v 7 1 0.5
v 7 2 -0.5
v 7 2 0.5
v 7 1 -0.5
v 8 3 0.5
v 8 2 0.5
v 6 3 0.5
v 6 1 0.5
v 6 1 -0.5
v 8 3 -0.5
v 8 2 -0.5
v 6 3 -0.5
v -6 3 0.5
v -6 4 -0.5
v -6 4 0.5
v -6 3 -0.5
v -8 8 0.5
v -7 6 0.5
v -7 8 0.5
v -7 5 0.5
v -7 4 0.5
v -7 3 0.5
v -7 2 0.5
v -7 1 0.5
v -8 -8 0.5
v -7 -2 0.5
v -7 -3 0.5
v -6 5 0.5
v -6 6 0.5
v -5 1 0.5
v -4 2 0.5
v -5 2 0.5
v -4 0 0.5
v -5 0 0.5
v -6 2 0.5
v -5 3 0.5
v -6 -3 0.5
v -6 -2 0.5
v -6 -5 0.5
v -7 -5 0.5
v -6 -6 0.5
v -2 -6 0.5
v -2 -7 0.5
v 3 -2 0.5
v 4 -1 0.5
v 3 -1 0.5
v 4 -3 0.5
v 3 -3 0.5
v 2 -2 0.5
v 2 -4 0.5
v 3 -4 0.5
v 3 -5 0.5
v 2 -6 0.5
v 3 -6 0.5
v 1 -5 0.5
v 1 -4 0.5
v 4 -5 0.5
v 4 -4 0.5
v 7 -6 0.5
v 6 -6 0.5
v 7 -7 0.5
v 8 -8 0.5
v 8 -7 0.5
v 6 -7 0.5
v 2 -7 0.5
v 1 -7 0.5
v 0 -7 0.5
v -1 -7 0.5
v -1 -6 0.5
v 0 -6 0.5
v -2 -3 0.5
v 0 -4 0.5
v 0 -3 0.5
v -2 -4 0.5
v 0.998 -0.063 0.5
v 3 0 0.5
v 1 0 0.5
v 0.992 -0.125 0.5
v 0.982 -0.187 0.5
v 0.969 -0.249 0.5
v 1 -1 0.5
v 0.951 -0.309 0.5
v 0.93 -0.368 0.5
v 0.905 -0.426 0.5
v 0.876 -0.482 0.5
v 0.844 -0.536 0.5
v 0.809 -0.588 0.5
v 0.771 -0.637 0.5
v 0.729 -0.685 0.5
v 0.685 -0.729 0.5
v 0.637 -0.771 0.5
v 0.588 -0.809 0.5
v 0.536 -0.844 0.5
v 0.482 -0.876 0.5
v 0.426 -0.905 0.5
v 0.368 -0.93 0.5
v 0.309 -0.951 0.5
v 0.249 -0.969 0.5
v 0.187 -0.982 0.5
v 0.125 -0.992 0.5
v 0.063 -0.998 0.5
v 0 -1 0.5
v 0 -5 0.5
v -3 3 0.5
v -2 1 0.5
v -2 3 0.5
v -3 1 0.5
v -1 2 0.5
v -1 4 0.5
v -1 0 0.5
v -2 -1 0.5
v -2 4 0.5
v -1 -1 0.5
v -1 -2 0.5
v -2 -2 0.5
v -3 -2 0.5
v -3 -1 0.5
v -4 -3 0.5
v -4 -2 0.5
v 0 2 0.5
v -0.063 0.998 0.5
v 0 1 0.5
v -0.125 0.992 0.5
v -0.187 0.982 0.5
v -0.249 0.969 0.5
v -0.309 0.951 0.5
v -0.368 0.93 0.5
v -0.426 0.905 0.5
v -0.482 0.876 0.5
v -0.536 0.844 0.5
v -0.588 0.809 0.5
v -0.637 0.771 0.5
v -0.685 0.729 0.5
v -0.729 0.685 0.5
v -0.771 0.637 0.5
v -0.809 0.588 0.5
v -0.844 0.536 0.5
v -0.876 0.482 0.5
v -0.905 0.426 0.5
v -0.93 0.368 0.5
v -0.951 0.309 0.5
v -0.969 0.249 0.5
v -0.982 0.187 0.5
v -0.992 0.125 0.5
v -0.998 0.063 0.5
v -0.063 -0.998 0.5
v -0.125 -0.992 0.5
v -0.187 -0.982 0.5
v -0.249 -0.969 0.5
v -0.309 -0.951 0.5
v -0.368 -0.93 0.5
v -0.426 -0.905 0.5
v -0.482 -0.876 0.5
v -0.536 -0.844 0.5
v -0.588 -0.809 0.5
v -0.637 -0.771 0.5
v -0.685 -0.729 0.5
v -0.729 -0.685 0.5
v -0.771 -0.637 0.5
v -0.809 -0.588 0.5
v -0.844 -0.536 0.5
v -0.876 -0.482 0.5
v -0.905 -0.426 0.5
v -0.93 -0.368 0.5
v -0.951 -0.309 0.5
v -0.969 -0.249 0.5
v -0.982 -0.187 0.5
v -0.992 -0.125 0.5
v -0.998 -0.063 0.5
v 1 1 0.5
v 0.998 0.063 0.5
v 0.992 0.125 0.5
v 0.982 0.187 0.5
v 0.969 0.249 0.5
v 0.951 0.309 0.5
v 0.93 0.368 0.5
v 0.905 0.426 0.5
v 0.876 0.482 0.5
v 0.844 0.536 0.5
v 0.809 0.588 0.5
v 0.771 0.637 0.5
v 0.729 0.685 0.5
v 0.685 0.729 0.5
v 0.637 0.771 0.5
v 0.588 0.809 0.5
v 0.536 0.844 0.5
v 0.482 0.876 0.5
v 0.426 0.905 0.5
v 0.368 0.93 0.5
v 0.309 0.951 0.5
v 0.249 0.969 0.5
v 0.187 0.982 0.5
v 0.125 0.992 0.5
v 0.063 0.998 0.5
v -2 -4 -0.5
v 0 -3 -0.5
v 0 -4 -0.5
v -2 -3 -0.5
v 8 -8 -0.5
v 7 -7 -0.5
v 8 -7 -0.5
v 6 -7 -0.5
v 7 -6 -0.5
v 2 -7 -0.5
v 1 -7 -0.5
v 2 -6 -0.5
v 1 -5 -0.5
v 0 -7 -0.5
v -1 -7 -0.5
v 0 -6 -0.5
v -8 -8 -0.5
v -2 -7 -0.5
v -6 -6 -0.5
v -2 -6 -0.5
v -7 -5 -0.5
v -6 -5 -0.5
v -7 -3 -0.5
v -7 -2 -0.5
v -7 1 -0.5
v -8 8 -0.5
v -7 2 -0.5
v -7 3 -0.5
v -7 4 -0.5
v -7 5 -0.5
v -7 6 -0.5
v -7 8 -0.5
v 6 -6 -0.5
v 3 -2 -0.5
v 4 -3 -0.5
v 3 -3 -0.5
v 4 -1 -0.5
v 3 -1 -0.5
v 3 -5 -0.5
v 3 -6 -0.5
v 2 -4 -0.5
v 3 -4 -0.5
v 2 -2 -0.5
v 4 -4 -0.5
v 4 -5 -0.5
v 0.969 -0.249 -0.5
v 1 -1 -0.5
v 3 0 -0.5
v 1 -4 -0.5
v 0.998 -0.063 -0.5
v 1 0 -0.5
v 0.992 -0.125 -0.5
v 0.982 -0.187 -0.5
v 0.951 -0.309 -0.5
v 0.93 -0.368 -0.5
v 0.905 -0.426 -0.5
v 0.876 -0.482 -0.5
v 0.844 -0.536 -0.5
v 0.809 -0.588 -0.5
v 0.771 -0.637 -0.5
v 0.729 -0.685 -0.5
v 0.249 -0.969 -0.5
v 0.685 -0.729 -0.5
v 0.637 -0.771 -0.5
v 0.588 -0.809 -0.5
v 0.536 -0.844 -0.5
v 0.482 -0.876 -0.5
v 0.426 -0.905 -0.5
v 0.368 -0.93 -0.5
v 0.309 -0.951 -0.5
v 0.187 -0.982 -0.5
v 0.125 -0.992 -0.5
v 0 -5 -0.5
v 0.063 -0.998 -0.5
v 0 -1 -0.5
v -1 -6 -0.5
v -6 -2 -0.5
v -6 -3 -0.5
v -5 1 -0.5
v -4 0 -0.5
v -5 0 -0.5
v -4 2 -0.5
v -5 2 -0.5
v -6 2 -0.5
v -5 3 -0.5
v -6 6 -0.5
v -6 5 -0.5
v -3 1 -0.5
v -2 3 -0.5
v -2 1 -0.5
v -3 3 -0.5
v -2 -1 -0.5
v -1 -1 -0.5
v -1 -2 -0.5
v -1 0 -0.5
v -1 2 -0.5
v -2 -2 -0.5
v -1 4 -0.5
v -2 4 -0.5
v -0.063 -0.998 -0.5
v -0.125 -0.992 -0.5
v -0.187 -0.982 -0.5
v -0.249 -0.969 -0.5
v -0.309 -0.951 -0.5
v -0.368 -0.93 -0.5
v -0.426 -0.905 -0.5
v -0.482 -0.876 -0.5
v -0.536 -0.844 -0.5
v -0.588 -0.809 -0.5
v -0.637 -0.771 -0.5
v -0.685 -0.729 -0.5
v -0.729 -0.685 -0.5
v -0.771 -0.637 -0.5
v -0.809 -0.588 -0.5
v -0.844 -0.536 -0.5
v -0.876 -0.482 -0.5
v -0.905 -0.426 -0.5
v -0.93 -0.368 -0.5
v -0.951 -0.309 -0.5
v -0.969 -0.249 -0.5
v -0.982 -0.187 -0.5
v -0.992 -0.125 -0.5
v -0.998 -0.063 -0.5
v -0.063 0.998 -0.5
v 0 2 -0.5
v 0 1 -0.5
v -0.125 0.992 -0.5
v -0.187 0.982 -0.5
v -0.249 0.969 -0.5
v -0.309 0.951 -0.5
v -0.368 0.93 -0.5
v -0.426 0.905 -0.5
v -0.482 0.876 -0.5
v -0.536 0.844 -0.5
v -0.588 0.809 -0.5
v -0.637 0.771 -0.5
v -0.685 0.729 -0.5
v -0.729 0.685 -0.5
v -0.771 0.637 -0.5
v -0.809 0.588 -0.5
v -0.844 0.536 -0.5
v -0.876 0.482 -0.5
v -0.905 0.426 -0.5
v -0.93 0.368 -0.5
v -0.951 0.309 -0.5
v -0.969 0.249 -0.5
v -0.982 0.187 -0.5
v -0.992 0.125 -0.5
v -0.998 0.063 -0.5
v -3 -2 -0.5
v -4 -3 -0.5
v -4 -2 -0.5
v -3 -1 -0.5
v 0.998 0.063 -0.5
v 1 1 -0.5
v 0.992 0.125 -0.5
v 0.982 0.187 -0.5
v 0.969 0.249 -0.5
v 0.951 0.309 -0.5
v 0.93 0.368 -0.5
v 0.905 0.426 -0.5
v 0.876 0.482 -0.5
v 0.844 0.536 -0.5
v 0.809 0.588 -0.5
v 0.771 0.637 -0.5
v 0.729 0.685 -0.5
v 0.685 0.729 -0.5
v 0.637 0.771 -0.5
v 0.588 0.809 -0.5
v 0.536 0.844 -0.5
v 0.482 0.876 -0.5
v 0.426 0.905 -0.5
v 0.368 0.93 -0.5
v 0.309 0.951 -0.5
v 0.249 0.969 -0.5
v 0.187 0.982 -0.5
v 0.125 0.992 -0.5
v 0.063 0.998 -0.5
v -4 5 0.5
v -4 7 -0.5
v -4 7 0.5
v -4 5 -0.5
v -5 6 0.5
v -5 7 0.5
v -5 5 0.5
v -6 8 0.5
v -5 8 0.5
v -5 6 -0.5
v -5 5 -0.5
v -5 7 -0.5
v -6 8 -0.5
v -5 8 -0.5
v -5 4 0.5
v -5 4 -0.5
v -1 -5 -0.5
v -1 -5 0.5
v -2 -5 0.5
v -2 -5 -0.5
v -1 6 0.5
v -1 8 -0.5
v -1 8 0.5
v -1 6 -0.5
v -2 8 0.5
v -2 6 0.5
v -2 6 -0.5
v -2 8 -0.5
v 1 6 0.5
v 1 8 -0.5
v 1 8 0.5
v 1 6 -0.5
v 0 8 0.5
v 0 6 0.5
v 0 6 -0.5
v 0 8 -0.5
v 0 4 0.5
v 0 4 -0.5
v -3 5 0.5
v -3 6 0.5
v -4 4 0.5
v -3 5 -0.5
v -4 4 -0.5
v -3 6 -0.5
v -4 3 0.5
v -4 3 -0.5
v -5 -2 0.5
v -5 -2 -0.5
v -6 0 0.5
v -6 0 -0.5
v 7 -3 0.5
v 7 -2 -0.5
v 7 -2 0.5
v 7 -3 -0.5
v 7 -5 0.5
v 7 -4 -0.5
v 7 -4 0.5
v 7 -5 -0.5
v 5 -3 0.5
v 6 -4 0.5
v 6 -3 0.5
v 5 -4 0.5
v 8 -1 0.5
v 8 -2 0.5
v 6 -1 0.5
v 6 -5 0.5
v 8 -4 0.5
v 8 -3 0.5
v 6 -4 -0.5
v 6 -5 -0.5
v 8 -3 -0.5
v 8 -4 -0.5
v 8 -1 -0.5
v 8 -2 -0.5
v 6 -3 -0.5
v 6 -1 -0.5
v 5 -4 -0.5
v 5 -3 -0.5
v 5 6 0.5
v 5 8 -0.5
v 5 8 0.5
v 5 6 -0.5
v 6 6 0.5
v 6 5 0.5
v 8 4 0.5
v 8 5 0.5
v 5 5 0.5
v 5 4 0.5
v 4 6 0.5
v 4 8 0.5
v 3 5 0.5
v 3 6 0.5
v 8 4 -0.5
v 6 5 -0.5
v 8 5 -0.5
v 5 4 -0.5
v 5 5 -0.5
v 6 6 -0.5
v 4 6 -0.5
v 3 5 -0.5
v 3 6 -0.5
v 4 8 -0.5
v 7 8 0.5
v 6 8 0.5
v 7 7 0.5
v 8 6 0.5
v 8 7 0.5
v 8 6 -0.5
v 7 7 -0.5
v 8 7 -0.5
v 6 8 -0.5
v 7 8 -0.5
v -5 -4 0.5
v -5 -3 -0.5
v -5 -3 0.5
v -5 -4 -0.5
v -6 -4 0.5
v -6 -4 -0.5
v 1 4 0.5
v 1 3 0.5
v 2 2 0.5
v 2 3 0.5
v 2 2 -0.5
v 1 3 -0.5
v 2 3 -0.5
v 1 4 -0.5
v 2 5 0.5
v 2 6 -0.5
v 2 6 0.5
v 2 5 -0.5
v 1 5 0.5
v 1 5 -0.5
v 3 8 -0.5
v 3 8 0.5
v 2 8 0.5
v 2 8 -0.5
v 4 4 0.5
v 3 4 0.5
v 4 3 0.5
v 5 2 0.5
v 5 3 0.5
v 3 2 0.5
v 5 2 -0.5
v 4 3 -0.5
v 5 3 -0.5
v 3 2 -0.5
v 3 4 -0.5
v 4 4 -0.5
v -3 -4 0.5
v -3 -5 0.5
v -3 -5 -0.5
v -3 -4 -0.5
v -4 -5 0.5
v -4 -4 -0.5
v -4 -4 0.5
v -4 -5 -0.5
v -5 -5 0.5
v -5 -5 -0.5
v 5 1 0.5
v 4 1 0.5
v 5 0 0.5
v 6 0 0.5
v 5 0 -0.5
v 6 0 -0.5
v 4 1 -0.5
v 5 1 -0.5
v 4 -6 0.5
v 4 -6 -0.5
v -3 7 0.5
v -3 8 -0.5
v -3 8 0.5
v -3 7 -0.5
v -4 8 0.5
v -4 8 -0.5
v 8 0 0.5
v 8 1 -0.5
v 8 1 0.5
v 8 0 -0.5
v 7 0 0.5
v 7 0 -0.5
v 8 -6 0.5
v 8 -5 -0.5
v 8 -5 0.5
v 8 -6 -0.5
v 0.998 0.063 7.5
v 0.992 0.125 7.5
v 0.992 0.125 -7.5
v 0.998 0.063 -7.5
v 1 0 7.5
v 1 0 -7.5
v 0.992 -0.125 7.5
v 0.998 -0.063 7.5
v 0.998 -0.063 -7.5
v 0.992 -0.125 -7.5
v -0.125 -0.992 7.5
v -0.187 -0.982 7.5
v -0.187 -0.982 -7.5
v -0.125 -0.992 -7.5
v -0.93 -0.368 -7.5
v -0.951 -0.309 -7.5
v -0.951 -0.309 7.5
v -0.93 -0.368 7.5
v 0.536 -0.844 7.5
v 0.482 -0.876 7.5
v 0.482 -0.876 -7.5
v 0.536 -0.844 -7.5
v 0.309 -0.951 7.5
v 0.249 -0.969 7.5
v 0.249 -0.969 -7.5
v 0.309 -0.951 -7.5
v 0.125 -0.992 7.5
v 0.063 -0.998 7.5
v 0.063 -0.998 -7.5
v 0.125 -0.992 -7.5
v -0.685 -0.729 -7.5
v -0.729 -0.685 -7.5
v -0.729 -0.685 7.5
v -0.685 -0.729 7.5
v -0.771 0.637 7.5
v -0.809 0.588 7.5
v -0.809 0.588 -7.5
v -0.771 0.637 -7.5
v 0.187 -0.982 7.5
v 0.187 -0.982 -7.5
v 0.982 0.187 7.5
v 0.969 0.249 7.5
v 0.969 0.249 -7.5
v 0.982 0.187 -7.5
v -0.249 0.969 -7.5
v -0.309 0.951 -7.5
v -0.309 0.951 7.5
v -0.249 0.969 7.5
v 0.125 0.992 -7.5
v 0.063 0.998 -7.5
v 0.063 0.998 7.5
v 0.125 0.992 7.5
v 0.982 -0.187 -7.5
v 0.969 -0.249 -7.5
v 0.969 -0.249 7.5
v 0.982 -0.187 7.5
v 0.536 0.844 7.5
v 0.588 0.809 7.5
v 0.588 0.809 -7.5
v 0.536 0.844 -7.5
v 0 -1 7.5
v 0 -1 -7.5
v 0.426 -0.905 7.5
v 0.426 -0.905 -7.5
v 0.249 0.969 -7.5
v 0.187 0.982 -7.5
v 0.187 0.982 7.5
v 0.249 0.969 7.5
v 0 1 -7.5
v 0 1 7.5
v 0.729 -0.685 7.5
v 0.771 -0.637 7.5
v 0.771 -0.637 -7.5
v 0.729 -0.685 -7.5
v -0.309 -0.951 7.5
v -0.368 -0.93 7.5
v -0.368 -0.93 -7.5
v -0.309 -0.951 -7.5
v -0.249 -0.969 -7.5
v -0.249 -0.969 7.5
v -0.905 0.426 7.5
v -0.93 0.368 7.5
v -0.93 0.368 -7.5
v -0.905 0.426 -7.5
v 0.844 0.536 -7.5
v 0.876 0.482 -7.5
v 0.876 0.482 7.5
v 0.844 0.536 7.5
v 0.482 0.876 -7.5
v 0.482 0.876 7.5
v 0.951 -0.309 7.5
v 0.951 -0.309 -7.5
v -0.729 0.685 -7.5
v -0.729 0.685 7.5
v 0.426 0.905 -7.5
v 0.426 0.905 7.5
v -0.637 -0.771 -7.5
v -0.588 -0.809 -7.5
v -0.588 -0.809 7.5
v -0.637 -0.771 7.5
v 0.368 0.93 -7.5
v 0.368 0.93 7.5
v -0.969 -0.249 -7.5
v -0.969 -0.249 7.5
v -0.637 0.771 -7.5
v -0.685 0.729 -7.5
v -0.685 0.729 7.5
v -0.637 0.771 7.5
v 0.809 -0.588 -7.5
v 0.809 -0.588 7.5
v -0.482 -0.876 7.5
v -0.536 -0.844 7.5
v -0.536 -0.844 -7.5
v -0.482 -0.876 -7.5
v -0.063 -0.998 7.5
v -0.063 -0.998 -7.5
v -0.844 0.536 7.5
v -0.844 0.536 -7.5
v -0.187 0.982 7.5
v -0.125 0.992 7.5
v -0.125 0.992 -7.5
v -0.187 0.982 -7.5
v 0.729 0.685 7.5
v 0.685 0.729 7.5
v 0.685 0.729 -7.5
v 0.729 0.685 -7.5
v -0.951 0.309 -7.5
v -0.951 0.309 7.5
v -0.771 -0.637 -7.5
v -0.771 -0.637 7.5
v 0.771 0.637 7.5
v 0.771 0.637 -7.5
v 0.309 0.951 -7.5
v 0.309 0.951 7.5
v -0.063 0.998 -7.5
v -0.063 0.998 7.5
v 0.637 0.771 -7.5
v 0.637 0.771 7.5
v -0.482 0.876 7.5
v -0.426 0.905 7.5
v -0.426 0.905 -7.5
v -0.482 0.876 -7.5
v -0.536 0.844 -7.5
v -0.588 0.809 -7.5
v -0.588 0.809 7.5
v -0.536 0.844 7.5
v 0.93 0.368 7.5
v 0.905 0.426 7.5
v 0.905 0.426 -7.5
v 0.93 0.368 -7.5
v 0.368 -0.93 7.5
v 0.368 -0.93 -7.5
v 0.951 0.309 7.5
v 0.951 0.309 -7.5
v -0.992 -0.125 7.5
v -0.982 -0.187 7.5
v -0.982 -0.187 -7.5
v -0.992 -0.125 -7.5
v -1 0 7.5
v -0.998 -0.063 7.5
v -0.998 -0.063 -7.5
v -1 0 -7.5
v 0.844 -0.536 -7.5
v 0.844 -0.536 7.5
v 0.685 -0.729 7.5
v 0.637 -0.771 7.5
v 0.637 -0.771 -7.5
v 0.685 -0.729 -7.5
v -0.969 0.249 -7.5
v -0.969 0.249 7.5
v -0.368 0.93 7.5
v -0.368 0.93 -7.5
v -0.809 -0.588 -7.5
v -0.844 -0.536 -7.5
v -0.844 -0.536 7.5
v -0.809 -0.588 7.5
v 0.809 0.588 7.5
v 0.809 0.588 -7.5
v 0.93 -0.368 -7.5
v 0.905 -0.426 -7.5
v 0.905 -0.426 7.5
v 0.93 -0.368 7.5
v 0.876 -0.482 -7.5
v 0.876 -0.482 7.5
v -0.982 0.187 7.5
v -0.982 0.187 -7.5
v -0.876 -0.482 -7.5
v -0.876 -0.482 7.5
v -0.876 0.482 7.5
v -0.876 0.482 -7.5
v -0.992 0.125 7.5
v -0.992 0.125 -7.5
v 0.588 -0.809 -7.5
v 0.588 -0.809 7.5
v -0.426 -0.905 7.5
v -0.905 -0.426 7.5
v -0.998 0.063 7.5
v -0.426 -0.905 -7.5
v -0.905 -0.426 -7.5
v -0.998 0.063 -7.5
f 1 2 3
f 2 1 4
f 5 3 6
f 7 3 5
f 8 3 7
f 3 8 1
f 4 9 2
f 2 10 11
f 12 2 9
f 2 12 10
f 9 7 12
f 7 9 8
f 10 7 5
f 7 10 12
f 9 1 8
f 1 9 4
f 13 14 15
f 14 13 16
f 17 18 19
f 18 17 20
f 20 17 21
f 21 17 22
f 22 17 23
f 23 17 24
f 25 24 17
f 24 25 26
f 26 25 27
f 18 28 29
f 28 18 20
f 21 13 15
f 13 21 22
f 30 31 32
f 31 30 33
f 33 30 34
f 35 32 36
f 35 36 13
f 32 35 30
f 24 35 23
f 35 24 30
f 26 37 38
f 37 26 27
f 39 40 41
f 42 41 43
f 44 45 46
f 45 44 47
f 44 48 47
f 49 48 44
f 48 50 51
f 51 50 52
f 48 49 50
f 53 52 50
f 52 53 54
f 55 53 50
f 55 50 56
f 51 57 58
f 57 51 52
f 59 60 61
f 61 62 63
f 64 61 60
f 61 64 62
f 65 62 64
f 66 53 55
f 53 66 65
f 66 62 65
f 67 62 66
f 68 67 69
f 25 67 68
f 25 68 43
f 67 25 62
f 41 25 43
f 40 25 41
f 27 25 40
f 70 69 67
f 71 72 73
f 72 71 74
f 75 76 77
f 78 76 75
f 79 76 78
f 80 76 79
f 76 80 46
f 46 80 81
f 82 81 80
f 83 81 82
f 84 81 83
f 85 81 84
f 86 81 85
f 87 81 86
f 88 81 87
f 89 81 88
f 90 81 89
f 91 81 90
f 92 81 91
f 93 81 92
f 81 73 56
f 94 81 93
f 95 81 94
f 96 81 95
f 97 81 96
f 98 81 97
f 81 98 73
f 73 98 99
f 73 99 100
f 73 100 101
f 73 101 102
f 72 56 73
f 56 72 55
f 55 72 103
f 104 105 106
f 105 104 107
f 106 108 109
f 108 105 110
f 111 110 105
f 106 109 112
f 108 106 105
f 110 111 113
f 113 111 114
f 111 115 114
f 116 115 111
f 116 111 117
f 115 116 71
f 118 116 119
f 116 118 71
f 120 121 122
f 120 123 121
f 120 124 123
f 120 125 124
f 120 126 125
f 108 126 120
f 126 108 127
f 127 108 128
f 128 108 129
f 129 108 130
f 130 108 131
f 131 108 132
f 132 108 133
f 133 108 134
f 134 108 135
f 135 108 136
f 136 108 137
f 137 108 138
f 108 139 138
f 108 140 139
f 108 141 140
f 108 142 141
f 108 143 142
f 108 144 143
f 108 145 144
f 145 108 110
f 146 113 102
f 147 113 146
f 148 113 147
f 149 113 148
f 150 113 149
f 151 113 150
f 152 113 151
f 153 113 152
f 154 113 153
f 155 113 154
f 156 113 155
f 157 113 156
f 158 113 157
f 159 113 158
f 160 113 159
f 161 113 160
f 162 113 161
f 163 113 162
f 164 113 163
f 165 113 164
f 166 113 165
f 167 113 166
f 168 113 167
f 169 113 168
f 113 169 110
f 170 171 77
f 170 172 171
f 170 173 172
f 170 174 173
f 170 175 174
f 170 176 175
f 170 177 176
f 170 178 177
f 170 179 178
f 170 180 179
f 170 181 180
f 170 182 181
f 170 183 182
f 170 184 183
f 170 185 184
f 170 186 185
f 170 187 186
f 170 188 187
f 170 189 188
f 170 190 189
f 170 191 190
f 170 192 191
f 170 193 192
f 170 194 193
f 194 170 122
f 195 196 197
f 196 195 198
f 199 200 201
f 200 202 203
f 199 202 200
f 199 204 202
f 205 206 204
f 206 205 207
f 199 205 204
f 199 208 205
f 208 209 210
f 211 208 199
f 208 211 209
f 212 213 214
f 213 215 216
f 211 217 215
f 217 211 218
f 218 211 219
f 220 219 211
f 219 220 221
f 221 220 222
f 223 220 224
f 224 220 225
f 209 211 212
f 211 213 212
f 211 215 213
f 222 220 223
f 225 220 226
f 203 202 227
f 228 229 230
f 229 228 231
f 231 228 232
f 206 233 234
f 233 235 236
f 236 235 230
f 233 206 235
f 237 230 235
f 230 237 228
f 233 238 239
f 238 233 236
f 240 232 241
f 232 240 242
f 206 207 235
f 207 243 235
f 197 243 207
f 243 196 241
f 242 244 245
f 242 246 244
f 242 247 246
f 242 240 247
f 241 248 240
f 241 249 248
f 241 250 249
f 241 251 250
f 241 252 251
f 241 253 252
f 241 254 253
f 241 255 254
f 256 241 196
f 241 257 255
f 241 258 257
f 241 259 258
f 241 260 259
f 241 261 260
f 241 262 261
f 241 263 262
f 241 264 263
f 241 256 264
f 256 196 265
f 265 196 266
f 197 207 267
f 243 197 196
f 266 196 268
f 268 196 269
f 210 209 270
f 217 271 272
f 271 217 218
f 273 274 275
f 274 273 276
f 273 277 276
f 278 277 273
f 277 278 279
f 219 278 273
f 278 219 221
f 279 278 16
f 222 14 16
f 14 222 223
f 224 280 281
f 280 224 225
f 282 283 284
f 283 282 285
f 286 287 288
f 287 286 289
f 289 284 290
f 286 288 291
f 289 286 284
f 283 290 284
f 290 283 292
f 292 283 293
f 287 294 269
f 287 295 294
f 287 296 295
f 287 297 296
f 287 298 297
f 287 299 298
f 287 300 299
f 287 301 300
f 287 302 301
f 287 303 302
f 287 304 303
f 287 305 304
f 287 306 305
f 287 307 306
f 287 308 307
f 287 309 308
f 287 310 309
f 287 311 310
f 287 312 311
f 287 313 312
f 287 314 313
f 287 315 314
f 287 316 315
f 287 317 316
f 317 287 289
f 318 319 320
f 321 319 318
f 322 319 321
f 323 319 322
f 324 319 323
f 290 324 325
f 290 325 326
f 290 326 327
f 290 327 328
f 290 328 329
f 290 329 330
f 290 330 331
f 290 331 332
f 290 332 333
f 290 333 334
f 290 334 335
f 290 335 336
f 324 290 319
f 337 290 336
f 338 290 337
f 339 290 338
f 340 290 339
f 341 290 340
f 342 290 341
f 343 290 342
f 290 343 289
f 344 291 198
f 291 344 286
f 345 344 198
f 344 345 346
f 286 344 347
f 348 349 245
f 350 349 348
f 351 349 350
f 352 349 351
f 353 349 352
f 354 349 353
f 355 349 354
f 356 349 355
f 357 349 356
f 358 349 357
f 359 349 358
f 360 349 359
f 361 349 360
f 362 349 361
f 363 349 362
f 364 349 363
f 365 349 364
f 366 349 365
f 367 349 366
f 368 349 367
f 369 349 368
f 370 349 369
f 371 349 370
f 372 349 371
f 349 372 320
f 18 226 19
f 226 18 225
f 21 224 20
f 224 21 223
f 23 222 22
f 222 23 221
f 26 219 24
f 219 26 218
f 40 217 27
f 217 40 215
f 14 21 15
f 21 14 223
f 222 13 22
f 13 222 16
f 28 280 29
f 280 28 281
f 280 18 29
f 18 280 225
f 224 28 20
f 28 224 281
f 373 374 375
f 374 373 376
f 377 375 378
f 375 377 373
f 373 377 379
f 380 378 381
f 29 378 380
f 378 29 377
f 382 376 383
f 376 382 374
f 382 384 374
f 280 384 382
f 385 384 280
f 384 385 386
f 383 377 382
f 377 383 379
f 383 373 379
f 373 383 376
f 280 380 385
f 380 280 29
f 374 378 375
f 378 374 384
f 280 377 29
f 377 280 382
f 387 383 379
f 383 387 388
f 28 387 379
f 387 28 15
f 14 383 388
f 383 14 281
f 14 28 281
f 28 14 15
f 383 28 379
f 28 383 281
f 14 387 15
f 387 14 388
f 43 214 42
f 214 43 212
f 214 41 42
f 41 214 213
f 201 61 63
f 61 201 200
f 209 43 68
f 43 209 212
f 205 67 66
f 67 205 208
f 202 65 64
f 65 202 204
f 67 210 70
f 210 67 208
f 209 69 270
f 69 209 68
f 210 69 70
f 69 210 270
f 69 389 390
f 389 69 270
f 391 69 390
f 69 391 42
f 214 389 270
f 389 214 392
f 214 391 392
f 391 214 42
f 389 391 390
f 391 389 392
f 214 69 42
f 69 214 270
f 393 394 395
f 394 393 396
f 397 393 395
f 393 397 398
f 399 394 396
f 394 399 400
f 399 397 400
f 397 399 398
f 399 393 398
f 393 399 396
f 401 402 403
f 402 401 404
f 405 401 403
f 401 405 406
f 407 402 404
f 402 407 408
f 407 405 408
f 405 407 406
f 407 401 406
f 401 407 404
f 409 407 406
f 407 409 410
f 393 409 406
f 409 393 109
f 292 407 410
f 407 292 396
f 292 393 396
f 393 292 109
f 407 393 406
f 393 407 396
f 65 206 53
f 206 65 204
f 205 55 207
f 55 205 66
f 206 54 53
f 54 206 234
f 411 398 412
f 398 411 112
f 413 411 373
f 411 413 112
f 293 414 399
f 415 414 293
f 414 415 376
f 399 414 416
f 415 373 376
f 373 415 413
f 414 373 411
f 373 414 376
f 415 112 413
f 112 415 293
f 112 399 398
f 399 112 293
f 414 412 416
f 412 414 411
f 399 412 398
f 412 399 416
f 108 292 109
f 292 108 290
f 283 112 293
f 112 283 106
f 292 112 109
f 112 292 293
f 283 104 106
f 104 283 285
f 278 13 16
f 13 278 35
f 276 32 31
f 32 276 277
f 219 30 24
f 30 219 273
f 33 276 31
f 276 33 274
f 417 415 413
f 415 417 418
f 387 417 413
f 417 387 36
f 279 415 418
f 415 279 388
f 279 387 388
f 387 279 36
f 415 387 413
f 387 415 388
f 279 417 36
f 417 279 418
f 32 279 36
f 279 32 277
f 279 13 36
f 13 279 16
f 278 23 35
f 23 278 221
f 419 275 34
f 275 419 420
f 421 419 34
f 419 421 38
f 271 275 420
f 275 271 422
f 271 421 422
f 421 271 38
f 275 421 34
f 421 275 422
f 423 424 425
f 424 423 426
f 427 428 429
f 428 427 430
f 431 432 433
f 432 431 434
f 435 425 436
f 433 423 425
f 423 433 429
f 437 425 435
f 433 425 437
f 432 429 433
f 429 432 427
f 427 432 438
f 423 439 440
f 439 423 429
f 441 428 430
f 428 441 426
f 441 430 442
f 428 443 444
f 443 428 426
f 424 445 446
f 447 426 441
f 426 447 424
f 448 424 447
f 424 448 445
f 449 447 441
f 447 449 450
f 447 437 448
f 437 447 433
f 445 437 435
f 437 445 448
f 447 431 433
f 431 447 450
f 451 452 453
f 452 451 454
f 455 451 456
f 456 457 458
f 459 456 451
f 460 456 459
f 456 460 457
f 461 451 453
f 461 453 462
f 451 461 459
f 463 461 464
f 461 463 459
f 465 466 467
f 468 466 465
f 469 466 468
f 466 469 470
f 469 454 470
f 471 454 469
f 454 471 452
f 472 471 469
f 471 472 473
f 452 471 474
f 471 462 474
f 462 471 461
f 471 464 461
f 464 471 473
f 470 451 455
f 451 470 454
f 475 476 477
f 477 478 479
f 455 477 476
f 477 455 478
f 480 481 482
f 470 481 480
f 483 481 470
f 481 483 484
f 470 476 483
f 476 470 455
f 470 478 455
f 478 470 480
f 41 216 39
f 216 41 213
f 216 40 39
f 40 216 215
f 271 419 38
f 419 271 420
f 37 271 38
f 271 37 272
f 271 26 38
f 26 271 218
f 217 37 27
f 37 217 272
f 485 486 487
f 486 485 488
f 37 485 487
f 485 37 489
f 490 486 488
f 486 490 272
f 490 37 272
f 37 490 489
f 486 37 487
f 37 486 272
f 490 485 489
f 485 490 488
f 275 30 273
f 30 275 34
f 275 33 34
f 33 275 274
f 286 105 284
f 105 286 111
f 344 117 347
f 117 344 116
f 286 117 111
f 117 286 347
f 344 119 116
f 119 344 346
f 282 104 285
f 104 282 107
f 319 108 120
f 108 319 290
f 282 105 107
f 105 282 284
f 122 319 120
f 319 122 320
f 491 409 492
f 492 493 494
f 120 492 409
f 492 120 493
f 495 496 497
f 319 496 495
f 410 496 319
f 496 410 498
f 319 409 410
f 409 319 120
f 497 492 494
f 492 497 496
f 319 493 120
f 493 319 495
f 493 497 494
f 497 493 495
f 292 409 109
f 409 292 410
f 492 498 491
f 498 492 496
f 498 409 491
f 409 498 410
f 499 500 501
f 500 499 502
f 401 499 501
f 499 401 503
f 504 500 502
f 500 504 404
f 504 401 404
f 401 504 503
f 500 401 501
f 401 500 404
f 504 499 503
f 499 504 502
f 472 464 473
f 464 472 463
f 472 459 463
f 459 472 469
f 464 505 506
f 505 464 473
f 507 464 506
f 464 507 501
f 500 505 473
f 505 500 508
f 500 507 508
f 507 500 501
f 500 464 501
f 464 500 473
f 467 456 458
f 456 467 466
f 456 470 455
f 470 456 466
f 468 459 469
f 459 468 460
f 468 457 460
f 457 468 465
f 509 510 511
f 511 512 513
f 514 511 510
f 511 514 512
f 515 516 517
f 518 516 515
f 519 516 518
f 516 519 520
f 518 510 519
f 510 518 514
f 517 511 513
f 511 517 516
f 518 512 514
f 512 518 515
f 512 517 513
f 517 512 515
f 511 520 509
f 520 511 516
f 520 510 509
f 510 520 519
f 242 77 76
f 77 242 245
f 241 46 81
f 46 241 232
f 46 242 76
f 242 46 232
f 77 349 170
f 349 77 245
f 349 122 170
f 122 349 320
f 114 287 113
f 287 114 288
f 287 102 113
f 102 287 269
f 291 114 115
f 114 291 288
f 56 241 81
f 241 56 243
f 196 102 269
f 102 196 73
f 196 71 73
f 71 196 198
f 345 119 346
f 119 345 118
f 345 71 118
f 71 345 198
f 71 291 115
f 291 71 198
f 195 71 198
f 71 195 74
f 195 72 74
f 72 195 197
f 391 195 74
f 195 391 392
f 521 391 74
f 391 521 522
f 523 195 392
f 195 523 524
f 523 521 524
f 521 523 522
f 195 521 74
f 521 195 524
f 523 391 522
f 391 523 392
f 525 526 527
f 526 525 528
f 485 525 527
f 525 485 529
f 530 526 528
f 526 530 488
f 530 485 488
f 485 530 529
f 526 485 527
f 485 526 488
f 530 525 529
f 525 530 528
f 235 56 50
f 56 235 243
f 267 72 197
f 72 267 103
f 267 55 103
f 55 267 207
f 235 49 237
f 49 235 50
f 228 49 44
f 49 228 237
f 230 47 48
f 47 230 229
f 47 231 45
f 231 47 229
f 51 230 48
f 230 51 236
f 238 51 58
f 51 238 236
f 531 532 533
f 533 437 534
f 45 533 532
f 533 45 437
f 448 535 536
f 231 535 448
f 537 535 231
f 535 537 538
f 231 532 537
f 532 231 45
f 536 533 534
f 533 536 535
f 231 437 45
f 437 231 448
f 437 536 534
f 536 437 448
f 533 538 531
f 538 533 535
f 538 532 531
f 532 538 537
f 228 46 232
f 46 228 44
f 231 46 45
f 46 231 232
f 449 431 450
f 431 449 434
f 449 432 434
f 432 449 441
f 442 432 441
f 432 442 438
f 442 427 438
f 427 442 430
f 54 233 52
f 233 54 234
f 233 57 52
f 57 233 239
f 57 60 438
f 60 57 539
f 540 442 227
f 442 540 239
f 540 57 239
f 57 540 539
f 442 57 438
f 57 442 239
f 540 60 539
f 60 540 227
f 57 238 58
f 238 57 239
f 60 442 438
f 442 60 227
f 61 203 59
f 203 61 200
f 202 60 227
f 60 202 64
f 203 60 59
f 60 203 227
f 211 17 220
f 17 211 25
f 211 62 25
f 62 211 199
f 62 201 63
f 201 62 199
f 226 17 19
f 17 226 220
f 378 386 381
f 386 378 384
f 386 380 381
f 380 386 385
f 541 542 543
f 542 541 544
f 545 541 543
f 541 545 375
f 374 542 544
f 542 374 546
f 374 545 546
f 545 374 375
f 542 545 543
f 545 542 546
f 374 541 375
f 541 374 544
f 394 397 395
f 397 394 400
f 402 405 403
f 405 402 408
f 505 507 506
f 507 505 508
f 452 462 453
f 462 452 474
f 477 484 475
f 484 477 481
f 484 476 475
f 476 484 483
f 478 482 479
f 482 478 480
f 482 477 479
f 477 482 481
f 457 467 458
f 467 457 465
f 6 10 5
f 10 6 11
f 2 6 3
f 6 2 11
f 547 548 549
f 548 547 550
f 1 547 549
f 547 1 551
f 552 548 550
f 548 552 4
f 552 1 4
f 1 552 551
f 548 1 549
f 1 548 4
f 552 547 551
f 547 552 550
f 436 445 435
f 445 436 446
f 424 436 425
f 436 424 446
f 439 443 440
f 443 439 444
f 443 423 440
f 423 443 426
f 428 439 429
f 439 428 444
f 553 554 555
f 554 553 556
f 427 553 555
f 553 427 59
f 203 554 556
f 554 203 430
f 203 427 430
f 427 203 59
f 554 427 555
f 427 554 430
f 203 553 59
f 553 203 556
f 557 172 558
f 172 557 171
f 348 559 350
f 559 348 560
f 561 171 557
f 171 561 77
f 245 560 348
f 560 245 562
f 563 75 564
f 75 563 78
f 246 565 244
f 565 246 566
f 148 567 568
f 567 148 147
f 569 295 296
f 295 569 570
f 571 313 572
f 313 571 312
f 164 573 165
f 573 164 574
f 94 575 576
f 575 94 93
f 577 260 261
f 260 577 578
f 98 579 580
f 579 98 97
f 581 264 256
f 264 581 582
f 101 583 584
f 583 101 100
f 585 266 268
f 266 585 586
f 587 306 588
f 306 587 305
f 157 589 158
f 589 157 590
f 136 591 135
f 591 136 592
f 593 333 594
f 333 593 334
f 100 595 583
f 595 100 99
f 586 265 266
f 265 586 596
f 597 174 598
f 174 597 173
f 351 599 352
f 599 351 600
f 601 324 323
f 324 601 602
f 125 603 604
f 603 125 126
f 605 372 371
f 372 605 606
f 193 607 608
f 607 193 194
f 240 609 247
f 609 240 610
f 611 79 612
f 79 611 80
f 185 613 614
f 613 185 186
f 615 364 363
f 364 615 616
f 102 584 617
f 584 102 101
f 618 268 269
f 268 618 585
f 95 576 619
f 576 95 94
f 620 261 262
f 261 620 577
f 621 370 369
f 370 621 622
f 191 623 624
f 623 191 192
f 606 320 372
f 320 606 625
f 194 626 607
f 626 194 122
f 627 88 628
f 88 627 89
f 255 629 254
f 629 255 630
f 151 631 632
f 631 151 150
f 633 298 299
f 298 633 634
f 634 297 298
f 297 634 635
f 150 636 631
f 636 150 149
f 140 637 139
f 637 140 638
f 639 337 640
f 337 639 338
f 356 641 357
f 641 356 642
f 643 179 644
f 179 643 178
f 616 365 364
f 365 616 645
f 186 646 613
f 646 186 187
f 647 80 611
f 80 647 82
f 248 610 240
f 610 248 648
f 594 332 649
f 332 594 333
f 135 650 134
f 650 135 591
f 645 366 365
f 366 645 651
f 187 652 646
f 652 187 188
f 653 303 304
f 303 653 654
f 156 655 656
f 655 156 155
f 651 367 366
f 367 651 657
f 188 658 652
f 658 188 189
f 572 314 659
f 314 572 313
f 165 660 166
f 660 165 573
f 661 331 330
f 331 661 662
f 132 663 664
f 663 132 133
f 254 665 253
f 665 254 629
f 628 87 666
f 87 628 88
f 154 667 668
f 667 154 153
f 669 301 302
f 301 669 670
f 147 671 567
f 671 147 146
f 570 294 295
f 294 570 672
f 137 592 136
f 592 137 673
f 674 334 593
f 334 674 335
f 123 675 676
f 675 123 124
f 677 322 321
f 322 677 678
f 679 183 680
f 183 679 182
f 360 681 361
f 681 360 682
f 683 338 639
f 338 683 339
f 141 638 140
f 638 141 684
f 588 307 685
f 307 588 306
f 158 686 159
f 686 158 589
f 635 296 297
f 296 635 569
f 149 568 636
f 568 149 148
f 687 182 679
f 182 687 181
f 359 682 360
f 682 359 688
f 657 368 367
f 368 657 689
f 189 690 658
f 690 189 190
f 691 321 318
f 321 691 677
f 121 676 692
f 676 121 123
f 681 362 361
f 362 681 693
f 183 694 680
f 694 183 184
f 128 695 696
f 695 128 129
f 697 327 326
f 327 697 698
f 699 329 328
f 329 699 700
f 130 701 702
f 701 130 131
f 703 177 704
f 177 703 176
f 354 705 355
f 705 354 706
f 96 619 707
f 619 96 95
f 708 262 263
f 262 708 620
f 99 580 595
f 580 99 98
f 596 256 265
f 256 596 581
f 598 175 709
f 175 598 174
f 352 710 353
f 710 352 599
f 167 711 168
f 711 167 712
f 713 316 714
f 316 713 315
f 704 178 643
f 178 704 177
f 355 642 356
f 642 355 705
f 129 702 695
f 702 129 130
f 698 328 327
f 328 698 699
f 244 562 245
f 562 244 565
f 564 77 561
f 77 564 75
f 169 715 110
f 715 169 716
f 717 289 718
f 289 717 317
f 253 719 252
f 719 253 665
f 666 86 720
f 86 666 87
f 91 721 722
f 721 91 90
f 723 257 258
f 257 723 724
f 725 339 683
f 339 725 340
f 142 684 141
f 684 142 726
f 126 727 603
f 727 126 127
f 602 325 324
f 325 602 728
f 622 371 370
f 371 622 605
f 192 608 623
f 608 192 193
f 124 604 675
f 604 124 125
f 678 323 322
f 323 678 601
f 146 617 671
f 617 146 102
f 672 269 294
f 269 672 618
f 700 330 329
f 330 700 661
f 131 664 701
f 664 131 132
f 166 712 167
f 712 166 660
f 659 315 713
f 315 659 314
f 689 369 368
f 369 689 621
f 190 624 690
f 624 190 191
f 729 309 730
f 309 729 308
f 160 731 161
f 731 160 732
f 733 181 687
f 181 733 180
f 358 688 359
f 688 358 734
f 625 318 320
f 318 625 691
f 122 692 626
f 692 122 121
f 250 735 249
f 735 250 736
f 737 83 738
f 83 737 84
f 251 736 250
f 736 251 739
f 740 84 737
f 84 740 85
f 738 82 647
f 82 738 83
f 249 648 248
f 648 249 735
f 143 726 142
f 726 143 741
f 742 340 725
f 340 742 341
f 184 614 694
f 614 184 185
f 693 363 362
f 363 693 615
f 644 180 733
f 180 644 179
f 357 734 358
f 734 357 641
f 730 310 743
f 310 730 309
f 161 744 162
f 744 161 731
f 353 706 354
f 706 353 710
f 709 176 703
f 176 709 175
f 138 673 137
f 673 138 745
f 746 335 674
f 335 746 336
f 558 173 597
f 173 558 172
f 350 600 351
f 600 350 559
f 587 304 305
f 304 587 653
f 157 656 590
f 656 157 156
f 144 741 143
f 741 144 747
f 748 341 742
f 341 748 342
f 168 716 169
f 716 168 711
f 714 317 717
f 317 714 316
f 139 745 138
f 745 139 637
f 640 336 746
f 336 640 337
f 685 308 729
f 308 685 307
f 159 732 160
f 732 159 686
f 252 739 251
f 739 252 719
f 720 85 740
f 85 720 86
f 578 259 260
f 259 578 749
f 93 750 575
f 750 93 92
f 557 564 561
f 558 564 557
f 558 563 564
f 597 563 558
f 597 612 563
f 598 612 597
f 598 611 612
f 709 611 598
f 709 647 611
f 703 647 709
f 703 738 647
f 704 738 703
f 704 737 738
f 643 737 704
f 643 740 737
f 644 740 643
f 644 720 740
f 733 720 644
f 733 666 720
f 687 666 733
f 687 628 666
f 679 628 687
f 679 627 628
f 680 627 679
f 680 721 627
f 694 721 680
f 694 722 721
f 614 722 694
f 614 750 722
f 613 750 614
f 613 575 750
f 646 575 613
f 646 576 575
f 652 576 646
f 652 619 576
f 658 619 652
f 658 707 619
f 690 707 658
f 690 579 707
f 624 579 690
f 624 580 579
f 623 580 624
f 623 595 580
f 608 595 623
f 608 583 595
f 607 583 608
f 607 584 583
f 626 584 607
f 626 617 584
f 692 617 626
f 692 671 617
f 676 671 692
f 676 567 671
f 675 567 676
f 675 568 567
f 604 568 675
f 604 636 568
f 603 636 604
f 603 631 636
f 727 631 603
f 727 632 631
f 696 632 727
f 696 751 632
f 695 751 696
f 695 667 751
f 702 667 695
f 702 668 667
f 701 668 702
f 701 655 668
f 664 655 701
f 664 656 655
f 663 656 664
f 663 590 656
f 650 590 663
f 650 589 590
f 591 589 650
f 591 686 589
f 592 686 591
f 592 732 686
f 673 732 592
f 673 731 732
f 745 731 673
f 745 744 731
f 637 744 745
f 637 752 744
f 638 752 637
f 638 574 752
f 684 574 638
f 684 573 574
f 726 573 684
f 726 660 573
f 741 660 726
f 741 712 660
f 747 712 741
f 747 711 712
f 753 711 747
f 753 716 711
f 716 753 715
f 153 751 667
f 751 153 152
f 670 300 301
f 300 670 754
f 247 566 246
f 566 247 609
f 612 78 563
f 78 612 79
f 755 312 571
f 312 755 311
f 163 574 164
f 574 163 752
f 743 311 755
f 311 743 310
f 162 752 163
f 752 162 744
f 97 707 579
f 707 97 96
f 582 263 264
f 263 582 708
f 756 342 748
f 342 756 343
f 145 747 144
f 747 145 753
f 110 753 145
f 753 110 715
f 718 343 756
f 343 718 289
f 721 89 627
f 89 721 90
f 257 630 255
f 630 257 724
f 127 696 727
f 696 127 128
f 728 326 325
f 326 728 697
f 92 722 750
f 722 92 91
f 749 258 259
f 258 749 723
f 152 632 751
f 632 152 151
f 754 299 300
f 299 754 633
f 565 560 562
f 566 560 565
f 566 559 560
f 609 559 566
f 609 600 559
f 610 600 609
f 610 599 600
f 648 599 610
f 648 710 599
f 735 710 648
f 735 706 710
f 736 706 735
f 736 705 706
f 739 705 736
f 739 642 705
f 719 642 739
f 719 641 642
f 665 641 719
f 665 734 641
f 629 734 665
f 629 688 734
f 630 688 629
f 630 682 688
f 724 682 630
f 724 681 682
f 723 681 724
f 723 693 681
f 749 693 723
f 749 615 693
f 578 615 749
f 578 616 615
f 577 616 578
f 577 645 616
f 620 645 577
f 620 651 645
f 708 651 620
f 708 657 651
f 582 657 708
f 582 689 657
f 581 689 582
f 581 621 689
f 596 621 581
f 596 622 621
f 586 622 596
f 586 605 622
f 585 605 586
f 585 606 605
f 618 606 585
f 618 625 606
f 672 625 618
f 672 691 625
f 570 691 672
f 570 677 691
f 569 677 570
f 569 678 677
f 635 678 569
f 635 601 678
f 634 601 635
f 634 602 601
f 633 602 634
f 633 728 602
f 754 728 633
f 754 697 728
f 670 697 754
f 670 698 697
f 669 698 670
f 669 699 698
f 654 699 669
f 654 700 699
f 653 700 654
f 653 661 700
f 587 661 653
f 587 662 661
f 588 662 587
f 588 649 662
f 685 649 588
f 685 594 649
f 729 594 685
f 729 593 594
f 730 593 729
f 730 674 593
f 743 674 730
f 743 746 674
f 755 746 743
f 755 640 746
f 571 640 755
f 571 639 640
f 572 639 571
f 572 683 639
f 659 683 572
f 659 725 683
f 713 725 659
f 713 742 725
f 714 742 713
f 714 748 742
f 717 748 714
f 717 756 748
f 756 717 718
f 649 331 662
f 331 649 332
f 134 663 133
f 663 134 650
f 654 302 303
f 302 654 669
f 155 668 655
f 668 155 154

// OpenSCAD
/* Unit Test 16: same as test case 05, center=true */
use <../datamatrix.scad>
data_matrix(dm_ascii("Wikipedia"), mark="black", center=true);

/* indicate where the origin is since the images don't show the axes */
cylinder(15, 1, center=true, $fn=100);
